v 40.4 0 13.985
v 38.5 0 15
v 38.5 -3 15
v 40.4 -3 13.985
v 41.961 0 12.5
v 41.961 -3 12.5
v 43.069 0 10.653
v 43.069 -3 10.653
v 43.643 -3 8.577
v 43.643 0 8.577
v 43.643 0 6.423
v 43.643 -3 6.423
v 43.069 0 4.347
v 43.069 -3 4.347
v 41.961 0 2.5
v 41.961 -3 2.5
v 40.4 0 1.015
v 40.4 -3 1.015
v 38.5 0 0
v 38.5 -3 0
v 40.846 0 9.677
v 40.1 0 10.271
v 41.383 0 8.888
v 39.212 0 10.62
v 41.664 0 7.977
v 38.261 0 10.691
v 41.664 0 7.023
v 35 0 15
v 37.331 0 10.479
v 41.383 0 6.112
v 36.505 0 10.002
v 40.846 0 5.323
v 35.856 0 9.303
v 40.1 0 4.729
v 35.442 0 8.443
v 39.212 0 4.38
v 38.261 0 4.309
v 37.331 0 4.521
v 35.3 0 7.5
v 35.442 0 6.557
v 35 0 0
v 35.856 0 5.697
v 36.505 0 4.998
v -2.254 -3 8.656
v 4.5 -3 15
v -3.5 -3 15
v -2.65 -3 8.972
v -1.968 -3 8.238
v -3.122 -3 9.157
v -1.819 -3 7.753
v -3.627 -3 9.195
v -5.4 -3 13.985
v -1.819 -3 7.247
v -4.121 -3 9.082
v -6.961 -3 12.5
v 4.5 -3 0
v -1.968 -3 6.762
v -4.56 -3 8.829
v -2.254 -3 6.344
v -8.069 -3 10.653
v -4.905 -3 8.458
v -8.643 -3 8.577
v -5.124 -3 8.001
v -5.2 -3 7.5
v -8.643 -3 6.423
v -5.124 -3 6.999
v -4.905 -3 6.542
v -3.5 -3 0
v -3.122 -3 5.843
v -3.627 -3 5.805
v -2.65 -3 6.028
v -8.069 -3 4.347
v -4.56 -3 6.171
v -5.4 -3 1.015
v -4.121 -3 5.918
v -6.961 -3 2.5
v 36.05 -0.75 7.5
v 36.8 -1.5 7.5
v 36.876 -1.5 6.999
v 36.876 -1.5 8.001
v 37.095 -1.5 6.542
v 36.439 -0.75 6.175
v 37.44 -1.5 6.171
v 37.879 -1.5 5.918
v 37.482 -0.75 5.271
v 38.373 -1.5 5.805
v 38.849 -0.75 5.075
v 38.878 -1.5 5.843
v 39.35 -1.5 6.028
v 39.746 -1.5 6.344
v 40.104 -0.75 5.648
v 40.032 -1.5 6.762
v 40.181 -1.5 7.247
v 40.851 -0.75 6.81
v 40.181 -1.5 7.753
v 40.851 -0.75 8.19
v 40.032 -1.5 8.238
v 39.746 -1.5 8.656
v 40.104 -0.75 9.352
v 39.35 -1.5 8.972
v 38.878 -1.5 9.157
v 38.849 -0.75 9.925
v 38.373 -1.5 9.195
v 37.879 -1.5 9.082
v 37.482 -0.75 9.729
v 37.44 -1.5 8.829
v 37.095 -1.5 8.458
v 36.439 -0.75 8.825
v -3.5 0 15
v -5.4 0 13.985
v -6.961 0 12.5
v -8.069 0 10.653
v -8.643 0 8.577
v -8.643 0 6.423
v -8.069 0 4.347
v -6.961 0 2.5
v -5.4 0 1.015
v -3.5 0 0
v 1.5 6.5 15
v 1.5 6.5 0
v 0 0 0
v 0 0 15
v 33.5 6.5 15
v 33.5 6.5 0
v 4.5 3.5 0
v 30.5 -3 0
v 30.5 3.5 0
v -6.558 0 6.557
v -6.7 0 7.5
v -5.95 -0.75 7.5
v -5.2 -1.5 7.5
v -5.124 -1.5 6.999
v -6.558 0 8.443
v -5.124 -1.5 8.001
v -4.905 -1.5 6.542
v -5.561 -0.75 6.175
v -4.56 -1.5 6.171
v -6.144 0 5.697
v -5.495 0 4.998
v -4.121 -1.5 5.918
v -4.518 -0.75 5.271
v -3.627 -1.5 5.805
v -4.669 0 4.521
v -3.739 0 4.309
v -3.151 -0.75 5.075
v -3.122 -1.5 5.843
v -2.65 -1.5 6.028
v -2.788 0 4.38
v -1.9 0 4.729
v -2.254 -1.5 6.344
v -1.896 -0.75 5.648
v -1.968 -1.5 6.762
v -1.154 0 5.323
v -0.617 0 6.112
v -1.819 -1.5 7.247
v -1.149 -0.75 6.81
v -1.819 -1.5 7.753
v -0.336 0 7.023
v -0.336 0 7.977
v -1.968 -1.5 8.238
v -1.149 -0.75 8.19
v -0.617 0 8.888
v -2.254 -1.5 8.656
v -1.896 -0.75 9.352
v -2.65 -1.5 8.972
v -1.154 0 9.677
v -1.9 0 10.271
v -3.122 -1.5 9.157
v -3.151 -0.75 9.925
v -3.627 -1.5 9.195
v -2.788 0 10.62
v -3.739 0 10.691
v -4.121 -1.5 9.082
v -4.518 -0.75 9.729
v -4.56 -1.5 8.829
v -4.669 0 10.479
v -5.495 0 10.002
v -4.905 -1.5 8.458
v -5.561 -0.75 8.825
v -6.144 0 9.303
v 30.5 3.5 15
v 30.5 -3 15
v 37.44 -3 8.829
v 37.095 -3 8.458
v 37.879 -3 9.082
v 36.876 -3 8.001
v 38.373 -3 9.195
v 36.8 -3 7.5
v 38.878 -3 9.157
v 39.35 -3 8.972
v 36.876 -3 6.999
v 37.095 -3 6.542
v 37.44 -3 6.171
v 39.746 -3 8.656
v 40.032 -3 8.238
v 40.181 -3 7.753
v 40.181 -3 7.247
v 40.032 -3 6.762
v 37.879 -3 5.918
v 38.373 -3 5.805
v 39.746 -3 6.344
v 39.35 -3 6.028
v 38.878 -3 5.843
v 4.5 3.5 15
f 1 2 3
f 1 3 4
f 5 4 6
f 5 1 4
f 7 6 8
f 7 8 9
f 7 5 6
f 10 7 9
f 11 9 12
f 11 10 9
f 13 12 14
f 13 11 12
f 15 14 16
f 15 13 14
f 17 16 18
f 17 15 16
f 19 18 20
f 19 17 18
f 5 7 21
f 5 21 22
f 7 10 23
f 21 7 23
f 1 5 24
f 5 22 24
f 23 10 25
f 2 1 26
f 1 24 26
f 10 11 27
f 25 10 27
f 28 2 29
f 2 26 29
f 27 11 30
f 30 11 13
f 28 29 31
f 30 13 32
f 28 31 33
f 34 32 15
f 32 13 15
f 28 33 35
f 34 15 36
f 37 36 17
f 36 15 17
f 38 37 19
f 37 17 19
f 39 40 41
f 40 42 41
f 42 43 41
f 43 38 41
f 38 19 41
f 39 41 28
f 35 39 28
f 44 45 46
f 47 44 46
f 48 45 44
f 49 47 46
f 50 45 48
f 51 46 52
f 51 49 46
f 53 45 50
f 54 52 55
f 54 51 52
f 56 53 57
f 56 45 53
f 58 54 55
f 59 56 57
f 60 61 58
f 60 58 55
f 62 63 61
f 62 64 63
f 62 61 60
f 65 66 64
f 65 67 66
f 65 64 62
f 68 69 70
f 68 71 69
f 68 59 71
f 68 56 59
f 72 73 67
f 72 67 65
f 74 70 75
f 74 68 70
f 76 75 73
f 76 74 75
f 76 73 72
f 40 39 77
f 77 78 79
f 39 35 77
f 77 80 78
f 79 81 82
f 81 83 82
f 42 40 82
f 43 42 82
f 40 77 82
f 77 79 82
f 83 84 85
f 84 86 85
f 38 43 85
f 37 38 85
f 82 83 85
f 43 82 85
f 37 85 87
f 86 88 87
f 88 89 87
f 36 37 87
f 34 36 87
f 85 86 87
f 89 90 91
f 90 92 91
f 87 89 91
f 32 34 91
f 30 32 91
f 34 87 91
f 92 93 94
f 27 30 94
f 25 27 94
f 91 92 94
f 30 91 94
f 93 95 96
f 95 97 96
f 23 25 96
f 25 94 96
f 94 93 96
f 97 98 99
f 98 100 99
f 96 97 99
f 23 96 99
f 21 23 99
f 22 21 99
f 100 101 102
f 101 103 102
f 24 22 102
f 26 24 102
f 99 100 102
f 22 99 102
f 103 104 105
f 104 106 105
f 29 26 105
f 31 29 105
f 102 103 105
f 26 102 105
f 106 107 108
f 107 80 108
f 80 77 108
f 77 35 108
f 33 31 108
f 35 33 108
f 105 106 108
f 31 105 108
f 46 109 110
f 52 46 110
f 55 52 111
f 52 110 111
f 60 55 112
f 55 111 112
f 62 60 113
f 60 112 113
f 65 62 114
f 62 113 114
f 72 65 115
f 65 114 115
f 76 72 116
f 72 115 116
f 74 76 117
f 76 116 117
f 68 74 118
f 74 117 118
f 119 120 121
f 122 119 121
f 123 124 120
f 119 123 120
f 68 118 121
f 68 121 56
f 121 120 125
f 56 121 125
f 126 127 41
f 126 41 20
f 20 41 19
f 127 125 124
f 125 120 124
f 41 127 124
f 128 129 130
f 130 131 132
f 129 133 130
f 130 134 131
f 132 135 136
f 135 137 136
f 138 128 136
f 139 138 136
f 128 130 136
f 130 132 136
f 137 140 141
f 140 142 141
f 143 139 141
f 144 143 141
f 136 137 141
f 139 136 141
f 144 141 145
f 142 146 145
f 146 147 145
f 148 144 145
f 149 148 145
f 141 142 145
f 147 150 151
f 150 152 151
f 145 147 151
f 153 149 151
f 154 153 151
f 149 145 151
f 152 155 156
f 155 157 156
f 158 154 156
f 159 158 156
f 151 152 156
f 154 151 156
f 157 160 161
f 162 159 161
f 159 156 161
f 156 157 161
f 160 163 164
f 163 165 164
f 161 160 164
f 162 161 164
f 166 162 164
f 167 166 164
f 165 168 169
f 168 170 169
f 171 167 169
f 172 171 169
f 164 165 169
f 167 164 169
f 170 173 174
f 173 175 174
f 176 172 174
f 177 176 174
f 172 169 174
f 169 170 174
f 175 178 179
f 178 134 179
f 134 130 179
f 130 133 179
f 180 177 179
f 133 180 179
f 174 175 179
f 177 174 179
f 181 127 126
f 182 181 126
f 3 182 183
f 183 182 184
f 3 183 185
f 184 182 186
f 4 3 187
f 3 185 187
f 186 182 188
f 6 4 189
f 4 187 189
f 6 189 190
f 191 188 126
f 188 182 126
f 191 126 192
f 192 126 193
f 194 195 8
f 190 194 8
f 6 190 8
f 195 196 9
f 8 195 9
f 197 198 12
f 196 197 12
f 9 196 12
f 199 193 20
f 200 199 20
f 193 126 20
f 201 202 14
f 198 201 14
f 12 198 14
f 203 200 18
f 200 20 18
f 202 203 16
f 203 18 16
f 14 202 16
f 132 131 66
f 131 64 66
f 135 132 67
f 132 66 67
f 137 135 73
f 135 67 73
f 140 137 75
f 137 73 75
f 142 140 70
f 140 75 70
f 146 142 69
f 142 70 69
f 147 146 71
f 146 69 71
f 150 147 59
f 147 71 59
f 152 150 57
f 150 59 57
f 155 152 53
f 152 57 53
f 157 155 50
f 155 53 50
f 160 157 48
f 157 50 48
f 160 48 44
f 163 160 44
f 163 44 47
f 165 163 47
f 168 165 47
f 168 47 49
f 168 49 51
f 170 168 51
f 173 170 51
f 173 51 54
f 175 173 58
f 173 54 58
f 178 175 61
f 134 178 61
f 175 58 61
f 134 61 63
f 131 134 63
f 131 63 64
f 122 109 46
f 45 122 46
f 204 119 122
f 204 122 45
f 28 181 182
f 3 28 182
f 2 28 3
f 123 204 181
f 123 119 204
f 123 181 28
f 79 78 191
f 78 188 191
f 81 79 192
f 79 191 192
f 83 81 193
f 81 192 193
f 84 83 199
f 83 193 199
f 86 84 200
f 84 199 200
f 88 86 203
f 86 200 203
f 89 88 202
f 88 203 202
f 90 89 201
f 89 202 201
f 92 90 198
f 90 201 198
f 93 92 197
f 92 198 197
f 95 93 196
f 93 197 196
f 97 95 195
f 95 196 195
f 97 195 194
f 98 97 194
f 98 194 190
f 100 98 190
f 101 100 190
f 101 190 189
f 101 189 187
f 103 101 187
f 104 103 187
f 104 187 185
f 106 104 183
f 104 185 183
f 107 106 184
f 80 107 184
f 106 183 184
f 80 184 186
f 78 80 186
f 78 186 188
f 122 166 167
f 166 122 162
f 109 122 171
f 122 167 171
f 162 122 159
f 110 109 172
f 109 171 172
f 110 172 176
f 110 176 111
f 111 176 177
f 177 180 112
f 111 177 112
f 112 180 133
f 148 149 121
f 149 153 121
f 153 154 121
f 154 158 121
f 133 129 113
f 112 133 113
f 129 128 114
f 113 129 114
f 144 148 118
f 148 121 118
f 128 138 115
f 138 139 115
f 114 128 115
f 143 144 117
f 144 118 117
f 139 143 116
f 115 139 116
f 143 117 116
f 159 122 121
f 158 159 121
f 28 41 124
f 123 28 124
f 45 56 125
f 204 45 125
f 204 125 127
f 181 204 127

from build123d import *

# Parameters (mm, degrees)
BOSS_EXTRUDE1_DEPTH                                 = 15
BOSS_EXTRUDE2_DEPTH                                 = 3
CSK_FOR_M3_COUNTERSUNK_FLAT_HEAD_SCREW1_D           = 3.4
CSK_FOR_M3_COUNTERSUNK_FLAT_HEAD_SCREW1_DEPTH       = 64
CSK_FOR_M3_COUNTERSUNK_FLAT_HEAD_SCREW1_CSINK_D     = 6.4
CSK_FOR_M3_COUNTERSUNK_FLAT_HEAD_SCREW1_CSINK_ANGLE = 90
CSK_FOR_M3_COUNTERSUNK_FLAT_HEAD_SCREW1_TIP         = 1.021463052


with BuildPart() as part:
    # Sketch2 → Boss-Extrude1 (new body)
    with BuildSketch(Plane.XY):
        Polygon((1.5, 6.5), (0, 0), (-3.5, 0), (-3.5, -3), (4.5, -3), (4.5, 3.5), (30.5, 3.5), (30.5, -3), (38.5, -3), (38.5, 0), (35, 0), (33.5, 6.5), align=None)
    extrude(amount=BOSS_EXTRUDE1_DEPTH)

    # Sketch3 → Boss-Extrude2 (add)
    with BuildSketch(Plane(origin=(0, 0, 0), x_dir=(1, 0, 0), z_dir=(0, 1, 0))):
        with BuildLine():
            Line((-3.5, 0), (-3.5, -15))
            ThreePointArc((-3.5, -15), (-8.716117819, -7.5), (-3.5, 0))
        make_face()
        with BuildLine():
            Line((38.5, 0), (38.5, -15))
            ThreePointArc((38.5, -15), (43.716117819, -7.5), (38.5, 0))
        make_face()
    extrude(amount=-BOSS_EXTRUDE2_DEPTH)

    # CSK for M3 Countersunk Flat Head Screw1
    with Locations(Plane(origin=(0, 0, 0), x_dir=(1, 0, 0), z_dir=(0, 1, 0))):
        with Locations((-3.5, -7.5), (38.5, -7.5)):
            CounterSinkHole(CSK_FOR_M3_COUNTERSUNK_FLAT_HEAD_SCREW1_D / 2, CSK_FOR_M3_COUNTERSUNK_FLAT_HEAD_SCREW1_CSINK_D / 2, depth=CSK_FOR_M3_COUNTERSUNK_FLAT_HEAD_SCREW1_DEPTH, counter_sink_angle=CSK_FOR_M3_COUNTERSUNK_FLAT_HEAD_SCREW1_CSINK_ANGLE)
            with Locations((0, 0, -(CSK_FOR_M3_COUNTERSUNK_FLAT_HEAD_SCREW1_DEPTH + CSK_FOR_M3_COUNTERSUNK_FLAT_HEAD_SCREW1_TIP / 2))):  # 118° drill point
                Cone(0, CSK_FOR_M3_COUNTERSUNK_FLAT_HEAD_SCREW1_D / 2, CSK_FOR_M3_COUNTERSUNK_FLAT_HEAD_SCREW1_TIP, mode=Mode.SUBTRACT)


solid = part.part
